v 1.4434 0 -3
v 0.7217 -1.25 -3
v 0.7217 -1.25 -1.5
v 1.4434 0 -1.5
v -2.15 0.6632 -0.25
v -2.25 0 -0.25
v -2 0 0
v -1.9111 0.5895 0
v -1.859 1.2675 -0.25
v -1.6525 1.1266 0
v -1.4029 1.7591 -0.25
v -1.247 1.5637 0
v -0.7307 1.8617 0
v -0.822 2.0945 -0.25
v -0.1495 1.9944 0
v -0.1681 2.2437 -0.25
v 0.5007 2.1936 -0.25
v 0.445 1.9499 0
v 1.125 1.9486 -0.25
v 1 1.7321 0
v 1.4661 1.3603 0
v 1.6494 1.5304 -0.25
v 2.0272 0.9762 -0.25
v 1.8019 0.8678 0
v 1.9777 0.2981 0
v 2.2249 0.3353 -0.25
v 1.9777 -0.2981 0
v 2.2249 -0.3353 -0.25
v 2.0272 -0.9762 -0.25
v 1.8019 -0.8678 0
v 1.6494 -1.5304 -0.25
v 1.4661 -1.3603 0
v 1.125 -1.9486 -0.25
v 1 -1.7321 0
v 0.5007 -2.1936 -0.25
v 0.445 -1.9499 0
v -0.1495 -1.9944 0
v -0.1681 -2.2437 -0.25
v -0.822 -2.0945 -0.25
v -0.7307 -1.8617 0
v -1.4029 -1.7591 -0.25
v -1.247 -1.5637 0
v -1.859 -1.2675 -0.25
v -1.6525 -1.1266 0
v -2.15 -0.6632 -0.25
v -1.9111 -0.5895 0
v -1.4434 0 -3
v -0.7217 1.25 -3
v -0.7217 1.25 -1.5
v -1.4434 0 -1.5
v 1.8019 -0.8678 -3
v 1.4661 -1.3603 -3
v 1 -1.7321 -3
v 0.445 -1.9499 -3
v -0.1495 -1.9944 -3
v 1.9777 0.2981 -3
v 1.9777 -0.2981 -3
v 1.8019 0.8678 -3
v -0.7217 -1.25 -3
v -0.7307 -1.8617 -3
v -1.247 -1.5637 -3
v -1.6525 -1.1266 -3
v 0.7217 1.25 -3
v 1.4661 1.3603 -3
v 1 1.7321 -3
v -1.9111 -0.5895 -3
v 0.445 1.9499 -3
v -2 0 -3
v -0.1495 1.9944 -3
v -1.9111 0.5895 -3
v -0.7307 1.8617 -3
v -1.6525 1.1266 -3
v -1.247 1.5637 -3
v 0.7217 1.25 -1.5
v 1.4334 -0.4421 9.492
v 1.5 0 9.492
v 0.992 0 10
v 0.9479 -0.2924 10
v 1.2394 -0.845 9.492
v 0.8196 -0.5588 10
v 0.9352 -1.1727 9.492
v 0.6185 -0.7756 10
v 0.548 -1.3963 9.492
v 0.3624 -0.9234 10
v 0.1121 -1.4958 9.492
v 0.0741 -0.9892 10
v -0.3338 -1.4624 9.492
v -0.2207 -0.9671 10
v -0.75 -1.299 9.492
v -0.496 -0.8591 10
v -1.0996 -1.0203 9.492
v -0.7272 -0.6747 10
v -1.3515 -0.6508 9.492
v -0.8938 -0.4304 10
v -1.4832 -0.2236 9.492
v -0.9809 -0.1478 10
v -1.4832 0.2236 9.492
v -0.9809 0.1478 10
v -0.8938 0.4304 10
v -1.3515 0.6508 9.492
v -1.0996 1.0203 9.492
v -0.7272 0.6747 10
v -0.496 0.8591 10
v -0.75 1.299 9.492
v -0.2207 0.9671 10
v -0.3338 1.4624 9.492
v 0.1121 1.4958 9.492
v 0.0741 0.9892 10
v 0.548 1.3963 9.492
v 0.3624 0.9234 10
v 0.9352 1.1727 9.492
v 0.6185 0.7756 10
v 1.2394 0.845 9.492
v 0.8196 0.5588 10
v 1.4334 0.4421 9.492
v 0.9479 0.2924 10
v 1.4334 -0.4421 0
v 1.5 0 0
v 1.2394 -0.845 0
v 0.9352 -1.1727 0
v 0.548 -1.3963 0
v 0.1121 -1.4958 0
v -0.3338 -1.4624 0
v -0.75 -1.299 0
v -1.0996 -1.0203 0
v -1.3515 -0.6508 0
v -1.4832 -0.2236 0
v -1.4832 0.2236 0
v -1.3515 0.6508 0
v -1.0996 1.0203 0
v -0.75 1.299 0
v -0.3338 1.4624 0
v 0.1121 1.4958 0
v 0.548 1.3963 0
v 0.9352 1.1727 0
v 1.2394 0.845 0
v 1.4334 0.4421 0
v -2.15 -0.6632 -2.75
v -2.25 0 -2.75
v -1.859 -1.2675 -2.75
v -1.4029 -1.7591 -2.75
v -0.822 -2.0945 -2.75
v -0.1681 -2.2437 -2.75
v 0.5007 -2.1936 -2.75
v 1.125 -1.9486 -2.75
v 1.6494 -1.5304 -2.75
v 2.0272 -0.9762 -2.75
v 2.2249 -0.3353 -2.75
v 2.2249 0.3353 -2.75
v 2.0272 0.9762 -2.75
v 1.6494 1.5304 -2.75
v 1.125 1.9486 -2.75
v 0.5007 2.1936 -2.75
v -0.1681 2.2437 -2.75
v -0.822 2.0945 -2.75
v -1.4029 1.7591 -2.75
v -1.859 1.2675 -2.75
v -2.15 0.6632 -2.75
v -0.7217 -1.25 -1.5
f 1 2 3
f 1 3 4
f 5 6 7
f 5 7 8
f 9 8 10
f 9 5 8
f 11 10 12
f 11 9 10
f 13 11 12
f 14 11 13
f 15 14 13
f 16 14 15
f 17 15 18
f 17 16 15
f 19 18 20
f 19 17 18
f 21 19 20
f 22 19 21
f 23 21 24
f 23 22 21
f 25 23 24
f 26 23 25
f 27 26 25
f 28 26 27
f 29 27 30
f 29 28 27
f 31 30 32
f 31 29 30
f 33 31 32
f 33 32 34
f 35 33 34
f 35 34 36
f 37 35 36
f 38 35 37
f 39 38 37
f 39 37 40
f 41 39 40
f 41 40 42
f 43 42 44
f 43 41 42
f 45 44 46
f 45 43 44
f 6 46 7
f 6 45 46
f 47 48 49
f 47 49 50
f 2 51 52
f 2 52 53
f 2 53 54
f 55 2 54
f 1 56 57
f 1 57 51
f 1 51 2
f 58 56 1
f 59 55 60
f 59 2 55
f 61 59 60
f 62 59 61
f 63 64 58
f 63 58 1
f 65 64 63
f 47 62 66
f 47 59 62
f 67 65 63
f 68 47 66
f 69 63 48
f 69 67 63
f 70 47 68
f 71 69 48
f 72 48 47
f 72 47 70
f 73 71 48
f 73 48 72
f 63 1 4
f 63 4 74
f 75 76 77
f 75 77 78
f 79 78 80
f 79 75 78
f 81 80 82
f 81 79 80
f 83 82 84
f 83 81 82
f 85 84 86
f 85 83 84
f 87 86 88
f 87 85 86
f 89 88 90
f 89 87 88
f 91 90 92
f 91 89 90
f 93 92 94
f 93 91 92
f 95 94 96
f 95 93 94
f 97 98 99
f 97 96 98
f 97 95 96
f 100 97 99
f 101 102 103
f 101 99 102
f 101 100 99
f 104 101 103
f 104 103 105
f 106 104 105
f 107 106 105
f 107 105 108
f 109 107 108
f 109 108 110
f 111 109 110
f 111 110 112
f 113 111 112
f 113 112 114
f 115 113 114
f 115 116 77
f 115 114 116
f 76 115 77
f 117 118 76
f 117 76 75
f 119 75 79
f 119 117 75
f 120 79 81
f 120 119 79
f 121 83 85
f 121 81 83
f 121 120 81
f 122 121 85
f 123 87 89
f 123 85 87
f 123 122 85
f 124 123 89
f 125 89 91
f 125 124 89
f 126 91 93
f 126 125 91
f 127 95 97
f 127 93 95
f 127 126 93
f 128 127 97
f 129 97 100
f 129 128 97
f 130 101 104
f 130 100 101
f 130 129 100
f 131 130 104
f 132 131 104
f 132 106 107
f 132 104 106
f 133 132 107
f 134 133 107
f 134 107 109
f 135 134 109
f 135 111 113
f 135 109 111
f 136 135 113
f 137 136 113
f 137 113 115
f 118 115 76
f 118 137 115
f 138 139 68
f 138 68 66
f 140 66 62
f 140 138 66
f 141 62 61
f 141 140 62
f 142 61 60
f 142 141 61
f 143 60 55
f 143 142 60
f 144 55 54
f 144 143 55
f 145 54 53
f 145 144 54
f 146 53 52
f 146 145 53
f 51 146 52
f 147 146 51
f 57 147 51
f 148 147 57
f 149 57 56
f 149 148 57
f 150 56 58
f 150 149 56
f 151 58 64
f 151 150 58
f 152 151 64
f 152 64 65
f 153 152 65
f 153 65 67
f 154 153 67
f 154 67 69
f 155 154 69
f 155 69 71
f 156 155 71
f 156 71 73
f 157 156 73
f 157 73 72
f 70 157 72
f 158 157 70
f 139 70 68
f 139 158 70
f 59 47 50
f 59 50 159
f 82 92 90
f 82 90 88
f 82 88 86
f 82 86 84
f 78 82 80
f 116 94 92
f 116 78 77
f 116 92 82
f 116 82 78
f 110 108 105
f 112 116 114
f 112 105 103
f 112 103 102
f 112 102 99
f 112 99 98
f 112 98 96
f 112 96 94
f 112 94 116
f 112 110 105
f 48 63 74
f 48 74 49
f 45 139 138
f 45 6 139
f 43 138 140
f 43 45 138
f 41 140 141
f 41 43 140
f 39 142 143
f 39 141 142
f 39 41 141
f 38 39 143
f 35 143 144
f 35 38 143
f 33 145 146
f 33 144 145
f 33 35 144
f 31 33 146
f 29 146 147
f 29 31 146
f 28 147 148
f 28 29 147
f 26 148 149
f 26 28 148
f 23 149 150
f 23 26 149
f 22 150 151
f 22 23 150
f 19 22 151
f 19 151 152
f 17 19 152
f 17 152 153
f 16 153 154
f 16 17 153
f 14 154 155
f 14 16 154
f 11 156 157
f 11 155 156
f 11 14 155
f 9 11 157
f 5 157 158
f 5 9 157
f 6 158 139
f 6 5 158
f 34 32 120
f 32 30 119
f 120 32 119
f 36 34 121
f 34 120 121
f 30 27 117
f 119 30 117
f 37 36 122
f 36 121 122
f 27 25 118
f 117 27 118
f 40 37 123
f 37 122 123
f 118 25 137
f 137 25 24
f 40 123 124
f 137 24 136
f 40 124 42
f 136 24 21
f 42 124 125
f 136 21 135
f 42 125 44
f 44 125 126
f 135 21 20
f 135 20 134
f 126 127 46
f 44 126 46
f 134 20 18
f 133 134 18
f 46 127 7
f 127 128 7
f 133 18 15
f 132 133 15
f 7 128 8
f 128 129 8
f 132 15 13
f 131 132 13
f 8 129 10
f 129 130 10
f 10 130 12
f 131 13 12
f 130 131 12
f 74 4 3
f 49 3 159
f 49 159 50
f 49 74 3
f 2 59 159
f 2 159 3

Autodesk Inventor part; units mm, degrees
ref_plane "YZ Plane" through (0, 0, 0) normal (1, 0, 0) x (0, 1, 0)
ref_plane "XZ Plane" through (0, 0, 0) normal (0, 1, 0) x (-1, 0, 0)
ref_plane "XY Plane" through (0, 0, 0) normal (0, 0, 1) x (1, 0, 0)
sketch "Sketch1" plane through (0, 0, 0) normal (0, 0, 1) x (1, 0, 0)
  circle A0 centre (0, 0) radius 1.5
  dimension "d0" = 3
extrude "Extrusion1" add sketch "Sketch1" along normal blind 10
sketch "Sketch2" plane through (0, 0, 0) normal (0, 0, -1) x (-1, 0, 0)
  circle A0 centre (0, 0) radius 1.5 projected
  circle A1 centre (0, 0) radius 2.25
  dimension "d3" = 4.5
extrude "Extrusion2" add sketch "Sketch2" along normal blind 3 contours A0 | A1
sketch "Sketch3" plane through (0, 0, -3) normal (0, 0, -1) x (-1, 0, 0)
  circle A0 centre (0, 0) radius 2.25 projected
  line L0 (-0.7217, 1.25) -> (0.7217, 1.25)
  line L1 (0.7217, 1.25) -> (1.4434, 0)
  line L2 (1.4434, 0) -> (0.7217, -1.25)
  line L3 (0.7217, -1.25) -> (-0.7217, -1.25)
  line L4 (-0.7217, -1.25) -> (-1.4434, 0)
  line L5 (-1.4434, 0) -> (-0.7217, 1.25)
  dimension "d6" = 2.5
extrude "Extrusion3" cut sketch "Sketch3" against normal blind 1.5 contours L0 L1 L2 L3 L4 L5
thread "Thread1" size "M3x0.5" class "6g" standard "ANSI Metric M Profile" full length
chamfer "Chamfer1" distance 0.508 angle 45 1 edges at (-1.5, 0, 10)
chamfer "Chamfer2" distance 0.25 angle 45 2 edges at (2.25, 0, -3) (2.25, 0, 0)
properties part number "m3 x10" material "Steel"
